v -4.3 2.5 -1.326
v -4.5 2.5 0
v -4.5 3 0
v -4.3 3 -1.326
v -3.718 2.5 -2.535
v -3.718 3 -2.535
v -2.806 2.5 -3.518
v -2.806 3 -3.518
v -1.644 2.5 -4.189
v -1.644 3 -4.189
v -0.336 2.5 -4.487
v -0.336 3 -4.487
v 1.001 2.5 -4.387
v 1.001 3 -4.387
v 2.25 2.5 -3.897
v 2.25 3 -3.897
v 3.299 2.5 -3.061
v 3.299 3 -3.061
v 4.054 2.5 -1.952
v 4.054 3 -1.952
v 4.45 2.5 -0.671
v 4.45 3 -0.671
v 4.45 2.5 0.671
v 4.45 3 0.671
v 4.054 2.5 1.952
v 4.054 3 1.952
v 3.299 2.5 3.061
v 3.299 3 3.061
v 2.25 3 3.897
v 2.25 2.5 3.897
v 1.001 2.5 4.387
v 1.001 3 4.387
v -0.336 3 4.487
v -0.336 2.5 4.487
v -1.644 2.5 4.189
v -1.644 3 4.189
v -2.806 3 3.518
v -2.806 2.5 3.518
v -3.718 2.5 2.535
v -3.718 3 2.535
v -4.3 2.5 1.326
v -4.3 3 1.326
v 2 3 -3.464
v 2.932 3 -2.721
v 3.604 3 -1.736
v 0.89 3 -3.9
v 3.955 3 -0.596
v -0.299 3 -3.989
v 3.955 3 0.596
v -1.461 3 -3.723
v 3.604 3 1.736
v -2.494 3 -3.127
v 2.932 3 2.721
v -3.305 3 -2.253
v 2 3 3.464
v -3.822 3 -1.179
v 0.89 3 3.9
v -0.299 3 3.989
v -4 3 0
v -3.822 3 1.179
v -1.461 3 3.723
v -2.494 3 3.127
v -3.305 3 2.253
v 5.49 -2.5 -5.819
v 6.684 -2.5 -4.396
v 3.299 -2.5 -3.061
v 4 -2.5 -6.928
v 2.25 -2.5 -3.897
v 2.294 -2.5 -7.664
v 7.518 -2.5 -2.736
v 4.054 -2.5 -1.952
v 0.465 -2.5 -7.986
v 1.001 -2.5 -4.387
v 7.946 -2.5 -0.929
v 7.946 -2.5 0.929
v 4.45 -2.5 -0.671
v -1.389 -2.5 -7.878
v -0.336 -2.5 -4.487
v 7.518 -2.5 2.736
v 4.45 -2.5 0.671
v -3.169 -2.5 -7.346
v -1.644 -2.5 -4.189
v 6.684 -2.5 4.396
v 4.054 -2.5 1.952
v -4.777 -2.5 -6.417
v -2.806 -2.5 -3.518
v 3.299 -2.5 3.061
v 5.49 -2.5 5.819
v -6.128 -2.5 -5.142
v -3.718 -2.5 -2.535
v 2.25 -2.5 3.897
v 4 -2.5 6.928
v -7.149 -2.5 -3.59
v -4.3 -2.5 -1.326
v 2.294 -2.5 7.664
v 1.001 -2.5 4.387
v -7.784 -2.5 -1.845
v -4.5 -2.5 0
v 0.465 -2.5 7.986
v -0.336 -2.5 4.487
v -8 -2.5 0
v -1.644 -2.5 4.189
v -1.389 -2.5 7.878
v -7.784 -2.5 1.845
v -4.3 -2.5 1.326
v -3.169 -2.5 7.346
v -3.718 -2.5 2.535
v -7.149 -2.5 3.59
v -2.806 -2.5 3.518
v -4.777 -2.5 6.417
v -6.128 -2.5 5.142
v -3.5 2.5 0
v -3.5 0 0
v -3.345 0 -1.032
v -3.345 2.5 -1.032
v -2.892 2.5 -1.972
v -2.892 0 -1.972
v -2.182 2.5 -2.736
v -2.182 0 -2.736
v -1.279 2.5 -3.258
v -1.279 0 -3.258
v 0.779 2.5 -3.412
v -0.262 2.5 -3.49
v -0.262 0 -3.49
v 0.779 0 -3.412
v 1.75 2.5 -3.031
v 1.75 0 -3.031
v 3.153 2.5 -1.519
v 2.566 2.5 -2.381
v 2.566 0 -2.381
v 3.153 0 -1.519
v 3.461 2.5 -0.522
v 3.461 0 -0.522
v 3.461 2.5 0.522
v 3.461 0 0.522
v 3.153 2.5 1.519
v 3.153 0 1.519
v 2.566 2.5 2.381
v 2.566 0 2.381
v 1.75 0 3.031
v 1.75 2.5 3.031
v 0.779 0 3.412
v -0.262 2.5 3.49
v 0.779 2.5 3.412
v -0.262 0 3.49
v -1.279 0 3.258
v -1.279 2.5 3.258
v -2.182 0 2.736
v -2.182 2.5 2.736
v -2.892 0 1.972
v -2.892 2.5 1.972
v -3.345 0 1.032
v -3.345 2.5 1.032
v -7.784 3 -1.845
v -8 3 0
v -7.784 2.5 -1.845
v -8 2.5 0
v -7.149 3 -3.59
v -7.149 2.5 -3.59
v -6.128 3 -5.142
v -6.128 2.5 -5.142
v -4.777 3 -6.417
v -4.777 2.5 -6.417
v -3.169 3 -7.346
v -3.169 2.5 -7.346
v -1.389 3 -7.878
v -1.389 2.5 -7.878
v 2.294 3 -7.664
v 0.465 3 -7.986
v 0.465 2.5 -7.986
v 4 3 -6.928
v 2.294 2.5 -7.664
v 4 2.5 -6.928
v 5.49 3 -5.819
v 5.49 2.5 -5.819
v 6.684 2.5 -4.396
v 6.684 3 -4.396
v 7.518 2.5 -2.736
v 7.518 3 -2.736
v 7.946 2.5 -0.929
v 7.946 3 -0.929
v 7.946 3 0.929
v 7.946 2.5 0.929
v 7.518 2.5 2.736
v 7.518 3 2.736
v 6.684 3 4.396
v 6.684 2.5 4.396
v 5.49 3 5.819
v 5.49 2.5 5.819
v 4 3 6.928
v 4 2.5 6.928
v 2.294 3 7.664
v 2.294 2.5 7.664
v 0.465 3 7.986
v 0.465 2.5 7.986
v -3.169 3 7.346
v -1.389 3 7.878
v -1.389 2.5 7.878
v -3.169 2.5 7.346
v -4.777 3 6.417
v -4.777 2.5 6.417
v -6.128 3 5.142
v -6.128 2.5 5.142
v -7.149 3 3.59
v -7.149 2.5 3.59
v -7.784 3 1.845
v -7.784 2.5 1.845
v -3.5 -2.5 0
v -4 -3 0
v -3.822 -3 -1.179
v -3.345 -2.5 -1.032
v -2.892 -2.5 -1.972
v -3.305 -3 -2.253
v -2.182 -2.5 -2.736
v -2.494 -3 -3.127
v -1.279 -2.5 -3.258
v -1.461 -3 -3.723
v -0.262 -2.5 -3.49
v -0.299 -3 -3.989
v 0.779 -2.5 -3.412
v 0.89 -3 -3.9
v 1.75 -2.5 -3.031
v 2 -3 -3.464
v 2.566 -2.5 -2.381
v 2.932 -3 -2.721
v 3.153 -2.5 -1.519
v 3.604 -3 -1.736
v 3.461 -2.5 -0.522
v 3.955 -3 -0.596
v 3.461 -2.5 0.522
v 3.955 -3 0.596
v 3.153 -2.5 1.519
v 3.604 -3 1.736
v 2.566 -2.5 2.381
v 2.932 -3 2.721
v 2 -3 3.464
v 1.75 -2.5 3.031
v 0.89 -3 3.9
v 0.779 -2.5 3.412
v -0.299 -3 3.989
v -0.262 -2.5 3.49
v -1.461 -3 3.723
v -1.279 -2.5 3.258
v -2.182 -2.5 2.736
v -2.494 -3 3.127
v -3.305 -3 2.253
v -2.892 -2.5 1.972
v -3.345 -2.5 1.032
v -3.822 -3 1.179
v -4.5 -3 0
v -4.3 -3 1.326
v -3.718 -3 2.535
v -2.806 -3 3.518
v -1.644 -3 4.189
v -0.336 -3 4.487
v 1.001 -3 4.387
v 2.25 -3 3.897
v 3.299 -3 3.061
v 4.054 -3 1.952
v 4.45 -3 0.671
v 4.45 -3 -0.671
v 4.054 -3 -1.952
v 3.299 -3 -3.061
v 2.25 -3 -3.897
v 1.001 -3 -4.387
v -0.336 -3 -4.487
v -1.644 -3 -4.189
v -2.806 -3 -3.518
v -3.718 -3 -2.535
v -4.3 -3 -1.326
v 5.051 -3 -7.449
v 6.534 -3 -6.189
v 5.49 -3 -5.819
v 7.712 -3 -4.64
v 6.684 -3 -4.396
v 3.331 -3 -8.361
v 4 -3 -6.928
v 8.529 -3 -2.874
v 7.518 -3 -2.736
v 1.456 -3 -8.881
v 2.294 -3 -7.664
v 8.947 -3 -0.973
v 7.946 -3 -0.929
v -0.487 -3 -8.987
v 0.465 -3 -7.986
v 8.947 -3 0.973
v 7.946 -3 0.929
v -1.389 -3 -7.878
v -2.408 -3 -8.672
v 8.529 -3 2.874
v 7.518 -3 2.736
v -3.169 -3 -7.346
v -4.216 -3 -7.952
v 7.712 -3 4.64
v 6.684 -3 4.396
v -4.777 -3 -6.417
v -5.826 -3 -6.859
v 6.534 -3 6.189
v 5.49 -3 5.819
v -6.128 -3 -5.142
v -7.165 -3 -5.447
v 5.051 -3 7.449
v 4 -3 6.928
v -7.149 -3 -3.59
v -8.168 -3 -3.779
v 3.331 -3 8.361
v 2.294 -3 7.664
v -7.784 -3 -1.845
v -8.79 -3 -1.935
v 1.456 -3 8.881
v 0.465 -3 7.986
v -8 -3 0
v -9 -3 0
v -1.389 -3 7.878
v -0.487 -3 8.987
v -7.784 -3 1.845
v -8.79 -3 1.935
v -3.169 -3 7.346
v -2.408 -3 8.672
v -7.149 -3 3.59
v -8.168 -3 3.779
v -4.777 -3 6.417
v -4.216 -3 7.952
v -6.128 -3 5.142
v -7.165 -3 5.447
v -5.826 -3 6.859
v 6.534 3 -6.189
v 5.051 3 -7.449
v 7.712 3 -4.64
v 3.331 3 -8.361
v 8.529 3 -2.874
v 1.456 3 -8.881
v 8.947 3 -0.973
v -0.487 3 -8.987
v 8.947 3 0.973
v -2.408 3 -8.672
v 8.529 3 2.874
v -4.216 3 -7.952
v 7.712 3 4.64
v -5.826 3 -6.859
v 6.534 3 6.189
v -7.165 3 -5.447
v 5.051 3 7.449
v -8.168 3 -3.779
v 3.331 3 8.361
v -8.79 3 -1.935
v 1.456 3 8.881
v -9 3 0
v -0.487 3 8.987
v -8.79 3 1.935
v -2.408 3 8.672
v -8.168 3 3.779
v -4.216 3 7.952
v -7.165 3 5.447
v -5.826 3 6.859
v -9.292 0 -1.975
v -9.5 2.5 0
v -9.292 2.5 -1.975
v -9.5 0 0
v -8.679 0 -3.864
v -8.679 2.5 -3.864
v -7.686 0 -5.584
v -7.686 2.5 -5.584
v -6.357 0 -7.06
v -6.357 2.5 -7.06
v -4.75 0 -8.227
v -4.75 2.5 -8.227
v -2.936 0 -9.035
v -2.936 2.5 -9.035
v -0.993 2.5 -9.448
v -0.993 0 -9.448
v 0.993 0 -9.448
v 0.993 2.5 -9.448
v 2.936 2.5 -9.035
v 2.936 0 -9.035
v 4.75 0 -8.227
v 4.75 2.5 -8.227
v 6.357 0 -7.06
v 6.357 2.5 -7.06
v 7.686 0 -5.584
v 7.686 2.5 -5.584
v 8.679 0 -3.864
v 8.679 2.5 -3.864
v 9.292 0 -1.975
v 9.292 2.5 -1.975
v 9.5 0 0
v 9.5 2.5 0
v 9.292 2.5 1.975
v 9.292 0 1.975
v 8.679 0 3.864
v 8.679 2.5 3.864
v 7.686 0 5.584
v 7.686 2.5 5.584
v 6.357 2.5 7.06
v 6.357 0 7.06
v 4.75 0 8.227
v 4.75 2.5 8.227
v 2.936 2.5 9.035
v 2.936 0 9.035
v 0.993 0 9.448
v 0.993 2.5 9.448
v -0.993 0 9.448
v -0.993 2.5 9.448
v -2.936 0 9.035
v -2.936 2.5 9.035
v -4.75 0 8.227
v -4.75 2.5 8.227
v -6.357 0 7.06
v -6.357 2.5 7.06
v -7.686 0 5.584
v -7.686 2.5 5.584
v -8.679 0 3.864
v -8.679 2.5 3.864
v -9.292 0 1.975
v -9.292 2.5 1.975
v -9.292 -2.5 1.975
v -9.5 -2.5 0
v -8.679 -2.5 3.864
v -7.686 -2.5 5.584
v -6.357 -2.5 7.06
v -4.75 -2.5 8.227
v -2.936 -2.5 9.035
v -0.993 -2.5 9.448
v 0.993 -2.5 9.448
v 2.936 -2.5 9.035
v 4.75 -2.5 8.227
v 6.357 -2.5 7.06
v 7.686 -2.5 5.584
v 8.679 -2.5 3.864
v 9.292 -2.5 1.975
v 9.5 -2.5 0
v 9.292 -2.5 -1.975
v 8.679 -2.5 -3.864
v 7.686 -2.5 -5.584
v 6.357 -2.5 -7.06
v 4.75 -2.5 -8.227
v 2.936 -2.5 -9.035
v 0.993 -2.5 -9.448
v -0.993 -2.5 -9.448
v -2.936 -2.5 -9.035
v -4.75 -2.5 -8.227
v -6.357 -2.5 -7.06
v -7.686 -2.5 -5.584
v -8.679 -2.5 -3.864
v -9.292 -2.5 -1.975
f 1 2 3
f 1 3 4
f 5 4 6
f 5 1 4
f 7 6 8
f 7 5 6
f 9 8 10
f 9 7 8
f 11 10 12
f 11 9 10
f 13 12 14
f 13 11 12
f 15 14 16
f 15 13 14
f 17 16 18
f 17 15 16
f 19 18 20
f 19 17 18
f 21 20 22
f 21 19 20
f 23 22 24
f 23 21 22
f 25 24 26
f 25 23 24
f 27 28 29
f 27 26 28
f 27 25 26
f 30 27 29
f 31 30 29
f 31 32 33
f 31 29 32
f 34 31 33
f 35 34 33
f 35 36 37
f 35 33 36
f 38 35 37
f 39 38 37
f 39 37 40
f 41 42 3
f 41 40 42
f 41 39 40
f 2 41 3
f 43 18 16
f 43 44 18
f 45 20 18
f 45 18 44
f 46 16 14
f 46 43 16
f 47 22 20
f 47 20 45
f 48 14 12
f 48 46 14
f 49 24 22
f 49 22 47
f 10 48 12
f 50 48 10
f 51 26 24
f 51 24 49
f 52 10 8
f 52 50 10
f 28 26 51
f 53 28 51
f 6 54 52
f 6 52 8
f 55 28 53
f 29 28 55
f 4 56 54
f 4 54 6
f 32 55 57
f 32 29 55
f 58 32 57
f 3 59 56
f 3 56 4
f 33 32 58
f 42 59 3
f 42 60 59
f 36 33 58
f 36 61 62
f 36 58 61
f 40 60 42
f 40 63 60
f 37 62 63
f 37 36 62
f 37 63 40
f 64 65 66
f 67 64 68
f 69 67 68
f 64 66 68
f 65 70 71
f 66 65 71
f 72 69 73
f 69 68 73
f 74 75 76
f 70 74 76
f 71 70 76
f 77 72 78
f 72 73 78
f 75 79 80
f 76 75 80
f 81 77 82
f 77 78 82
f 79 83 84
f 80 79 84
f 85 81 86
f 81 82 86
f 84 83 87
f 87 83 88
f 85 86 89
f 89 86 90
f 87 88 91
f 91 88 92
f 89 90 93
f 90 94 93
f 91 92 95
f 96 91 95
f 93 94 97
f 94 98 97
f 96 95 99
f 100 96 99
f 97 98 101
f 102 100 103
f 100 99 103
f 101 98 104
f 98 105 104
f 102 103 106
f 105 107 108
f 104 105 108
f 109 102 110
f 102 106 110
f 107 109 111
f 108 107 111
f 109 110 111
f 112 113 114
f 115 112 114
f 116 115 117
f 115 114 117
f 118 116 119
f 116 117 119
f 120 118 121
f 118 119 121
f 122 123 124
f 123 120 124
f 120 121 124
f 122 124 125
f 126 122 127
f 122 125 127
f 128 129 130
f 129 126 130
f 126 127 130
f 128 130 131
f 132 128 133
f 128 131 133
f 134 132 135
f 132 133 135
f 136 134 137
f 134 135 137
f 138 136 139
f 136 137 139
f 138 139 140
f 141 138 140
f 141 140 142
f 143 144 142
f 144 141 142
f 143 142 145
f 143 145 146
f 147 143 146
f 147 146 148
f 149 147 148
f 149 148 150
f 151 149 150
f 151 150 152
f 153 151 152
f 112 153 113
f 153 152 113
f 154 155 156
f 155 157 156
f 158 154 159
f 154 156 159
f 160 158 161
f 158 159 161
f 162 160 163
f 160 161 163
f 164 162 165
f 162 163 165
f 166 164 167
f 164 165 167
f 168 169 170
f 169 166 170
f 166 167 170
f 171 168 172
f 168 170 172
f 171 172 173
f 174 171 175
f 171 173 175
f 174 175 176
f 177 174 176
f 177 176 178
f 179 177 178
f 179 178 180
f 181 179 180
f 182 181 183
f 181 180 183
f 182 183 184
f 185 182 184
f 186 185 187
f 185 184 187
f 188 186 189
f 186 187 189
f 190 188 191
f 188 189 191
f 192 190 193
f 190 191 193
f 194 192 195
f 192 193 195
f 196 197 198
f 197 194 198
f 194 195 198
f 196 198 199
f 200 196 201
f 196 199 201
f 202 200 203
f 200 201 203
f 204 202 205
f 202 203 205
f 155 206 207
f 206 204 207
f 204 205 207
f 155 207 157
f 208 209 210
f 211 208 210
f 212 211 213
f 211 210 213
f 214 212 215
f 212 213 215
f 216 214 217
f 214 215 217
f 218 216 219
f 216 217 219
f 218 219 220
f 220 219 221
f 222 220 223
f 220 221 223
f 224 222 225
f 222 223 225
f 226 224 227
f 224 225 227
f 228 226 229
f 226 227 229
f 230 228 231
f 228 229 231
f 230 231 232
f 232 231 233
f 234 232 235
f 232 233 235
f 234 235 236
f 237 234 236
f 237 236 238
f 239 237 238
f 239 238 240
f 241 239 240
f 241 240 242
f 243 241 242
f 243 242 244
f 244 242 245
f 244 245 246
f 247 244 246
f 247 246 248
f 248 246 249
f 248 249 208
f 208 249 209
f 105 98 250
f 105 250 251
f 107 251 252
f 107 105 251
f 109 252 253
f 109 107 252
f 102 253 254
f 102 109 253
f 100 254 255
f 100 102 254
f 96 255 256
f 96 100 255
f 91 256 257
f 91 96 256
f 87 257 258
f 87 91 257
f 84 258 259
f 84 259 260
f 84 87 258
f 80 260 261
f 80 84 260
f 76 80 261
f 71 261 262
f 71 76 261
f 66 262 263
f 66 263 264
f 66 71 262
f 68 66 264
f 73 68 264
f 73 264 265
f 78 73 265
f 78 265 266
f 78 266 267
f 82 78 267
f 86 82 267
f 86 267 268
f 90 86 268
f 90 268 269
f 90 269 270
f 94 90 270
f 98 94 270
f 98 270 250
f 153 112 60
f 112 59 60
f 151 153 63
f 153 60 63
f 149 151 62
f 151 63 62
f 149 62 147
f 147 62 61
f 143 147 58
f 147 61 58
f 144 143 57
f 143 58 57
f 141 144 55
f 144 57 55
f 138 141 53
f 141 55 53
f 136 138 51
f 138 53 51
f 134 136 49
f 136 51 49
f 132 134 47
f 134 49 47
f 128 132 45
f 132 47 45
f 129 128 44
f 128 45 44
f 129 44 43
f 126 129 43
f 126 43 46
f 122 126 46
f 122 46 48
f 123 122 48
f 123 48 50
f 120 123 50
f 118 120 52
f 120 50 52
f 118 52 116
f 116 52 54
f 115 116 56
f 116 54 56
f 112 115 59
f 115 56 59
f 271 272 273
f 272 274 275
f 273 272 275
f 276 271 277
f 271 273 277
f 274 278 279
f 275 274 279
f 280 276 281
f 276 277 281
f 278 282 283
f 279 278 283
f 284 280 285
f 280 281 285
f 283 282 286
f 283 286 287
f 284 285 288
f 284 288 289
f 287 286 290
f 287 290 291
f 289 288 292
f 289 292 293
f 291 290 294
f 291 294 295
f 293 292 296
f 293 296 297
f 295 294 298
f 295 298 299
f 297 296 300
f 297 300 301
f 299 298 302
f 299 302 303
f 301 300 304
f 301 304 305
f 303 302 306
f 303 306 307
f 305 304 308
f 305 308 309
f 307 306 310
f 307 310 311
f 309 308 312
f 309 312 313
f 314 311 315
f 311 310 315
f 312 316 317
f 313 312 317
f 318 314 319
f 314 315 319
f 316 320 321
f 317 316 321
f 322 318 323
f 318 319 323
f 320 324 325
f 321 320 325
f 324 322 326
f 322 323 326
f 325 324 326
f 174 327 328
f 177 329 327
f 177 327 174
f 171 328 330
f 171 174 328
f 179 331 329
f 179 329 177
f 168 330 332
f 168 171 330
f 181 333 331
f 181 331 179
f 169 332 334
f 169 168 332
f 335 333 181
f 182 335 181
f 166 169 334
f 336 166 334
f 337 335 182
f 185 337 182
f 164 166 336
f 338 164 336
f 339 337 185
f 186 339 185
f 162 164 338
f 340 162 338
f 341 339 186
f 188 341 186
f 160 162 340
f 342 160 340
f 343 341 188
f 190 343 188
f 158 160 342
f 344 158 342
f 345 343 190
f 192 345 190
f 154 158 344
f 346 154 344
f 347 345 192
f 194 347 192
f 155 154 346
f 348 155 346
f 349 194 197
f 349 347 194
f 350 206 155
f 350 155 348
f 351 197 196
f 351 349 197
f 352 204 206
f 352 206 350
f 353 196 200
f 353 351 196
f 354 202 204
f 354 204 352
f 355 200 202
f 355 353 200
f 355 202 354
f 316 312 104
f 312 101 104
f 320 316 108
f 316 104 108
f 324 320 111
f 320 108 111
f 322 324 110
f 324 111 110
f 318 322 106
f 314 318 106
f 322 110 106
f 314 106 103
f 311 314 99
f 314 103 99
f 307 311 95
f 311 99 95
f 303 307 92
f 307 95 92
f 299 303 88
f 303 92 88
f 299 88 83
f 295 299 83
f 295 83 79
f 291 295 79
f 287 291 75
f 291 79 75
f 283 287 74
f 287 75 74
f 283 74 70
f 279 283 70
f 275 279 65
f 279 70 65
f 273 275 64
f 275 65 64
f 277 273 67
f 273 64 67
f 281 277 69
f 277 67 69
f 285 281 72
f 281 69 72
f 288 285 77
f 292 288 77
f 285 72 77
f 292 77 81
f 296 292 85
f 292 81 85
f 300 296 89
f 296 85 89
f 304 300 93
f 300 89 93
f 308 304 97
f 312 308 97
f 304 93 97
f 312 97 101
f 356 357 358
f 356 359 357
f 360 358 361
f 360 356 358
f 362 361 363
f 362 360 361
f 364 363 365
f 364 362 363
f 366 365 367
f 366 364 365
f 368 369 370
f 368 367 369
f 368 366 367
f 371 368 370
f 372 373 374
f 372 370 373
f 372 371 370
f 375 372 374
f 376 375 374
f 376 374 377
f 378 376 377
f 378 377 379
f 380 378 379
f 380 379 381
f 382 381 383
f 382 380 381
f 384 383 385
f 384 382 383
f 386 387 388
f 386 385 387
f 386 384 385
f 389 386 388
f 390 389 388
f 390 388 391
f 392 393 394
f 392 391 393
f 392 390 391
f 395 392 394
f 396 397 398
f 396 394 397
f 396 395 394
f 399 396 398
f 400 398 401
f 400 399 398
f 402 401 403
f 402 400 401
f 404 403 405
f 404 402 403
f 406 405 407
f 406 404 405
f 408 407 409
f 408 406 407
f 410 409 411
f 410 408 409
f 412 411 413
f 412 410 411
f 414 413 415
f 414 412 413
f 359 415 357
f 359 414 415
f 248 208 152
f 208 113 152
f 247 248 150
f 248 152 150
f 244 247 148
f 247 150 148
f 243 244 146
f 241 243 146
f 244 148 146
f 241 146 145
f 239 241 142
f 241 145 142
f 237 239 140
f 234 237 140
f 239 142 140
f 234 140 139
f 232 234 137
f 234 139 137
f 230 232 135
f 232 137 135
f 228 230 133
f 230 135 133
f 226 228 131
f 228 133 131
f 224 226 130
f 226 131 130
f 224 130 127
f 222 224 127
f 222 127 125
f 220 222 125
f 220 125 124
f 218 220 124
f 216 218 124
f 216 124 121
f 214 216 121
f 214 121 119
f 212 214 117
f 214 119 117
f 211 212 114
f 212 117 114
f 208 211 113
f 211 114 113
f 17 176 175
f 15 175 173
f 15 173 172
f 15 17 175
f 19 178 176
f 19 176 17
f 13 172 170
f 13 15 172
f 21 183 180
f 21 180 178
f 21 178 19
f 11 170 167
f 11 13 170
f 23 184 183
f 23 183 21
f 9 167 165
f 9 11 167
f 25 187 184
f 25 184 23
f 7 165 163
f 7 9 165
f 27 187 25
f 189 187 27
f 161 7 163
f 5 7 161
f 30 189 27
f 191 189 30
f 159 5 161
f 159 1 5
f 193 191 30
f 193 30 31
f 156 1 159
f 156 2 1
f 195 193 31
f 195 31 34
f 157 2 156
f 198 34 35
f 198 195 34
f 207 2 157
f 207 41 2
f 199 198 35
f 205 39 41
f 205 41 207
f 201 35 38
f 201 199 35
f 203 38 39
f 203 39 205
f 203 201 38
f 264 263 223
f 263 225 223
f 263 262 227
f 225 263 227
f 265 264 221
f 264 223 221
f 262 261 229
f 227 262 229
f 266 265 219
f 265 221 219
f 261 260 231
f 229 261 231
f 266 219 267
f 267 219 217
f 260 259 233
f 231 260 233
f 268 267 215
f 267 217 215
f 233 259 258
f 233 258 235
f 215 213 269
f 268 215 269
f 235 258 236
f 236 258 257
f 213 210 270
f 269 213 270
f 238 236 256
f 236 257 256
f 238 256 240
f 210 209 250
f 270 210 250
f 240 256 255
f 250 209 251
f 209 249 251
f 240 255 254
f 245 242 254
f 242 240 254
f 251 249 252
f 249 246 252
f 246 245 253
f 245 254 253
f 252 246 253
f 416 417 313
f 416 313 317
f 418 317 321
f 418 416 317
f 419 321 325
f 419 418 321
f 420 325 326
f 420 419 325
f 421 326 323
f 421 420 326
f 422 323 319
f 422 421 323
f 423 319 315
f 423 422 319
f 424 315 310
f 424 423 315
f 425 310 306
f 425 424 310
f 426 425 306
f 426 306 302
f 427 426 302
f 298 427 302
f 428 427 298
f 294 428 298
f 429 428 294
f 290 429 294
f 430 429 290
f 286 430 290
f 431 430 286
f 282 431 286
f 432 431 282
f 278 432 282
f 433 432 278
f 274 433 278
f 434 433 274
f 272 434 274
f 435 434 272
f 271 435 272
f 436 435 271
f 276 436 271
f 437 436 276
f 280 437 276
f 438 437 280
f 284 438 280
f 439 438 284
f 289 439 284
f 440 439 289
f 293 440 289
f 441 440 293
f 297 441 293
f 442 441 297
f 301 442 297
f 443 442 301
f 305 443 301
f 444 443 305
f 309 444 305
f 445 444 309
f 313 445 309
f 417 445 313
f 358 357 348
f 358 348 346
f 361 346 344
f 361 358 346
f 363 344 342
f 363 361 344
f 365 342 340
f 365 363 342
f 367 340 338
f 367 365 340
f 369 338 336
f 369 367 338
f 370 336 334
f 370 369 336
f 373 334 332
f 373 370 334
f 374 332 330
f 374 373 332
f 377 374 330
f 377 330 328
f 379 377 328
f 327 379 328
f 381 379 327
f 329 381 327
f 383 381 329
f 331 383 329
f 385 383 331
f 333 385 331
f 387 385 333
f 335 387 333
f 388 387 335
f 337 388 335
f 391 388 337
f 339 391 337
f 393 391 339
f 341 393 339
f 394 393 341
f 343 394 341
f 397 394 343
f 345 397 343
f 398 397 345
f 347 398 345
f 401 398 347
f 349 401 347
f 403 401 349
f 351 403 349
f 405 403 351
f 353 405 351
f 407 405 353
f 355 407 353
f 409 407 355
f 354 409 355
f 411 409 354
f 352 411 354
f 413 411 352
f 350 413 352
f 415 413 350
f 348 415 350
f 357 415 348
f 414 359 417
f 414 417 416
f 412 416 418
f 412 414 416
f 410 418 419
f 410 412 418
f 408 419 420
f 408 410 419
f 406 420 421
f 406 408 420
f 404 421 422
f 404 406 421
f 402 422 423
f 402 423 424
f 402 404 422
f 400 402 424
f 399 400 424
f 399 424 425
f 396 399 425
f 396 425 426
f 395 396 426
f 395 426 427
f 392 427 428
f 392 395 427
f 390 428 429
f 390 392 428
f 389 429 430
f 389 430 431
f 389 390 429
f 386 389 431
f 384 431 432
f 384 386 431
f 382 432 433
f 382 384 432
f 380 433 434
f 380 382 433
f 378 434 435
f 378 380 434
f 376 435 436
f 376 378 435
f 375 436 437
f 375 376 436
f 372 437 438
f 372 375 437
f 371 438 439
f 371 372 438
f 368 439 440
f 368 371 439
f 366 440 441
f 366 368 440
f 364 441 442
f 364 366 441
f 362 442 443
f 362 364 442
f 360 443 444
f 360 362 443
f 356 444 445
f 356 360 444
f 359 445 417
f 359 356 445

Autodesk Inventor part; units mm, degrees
ref_plane "YZ Plane" through (0, 0, 0) normal (1, 0, 0) x (0, 1, 0)
ref_plane "XZ Plane" through (0, 0, 0) normal (0, 1, 0) x (-1, 0, 0)
ref_plane "XY Plane" through (0, 0, 0) normal (0, 0, 1) x (1, 0, 0)
sketch "Эскиз1" plane through (0, 0, 0) normal (0, 1, 0) x (-1, 0, 0)
  circle A0 centre (0, 0) radius 9.5
  circle A1 centre (0, 0) radius 3.5
  circle A2 centre (0, 0) radius 8
  circle A3 centre (0, 0) radius 4.5
  dimension "d0" = 19
  dimension "d3" = 7
  dimension "d4" = 1.5
  dimension "d5" = 1
extrude "Выдавливание1" add sketch "Эскиз1" along normal mid plane 6
extrude "Выдавливание2" add sketch "Эскиз1" along normal mid plane 5 contours A2
chamfer "Фаска1" distance 0.5 angle 45 4 edges at (9.5, -3, 0) (9.5, 3, 0) (3.5, -3, 0) (3.5, 3, 0)
equation "\"d0\" = bearing_outer"
equation "\"d3\" = bearing_inner"
equation "\"d6\" = bearing_width"
equation "\"blade_radius\" = 127"
equation "\"bearing_inner\" = 7"
equation "\"bearing_outer\" = 19"
equation "\"bearing_width\" = 6"
equation "\"beam_length\" = 254"
equation "\"motor_height\" = 24"
equation "\"motor_diameter\" = 28"
equation "\"motor_blade_offset\" = 2"
equation "\"M4_nut_lock_width\" = 6.8"
equation "\"M4_screw_innerHex_cap_diam\" = 6.6"
equation "\"M4_screw_innerHex_cap_height\" = 4"
equation "\"M4_nut_lock_height\" = 5"
properties part number "Подшипник" material "Сталь, высокопрочная, низколегированная"
